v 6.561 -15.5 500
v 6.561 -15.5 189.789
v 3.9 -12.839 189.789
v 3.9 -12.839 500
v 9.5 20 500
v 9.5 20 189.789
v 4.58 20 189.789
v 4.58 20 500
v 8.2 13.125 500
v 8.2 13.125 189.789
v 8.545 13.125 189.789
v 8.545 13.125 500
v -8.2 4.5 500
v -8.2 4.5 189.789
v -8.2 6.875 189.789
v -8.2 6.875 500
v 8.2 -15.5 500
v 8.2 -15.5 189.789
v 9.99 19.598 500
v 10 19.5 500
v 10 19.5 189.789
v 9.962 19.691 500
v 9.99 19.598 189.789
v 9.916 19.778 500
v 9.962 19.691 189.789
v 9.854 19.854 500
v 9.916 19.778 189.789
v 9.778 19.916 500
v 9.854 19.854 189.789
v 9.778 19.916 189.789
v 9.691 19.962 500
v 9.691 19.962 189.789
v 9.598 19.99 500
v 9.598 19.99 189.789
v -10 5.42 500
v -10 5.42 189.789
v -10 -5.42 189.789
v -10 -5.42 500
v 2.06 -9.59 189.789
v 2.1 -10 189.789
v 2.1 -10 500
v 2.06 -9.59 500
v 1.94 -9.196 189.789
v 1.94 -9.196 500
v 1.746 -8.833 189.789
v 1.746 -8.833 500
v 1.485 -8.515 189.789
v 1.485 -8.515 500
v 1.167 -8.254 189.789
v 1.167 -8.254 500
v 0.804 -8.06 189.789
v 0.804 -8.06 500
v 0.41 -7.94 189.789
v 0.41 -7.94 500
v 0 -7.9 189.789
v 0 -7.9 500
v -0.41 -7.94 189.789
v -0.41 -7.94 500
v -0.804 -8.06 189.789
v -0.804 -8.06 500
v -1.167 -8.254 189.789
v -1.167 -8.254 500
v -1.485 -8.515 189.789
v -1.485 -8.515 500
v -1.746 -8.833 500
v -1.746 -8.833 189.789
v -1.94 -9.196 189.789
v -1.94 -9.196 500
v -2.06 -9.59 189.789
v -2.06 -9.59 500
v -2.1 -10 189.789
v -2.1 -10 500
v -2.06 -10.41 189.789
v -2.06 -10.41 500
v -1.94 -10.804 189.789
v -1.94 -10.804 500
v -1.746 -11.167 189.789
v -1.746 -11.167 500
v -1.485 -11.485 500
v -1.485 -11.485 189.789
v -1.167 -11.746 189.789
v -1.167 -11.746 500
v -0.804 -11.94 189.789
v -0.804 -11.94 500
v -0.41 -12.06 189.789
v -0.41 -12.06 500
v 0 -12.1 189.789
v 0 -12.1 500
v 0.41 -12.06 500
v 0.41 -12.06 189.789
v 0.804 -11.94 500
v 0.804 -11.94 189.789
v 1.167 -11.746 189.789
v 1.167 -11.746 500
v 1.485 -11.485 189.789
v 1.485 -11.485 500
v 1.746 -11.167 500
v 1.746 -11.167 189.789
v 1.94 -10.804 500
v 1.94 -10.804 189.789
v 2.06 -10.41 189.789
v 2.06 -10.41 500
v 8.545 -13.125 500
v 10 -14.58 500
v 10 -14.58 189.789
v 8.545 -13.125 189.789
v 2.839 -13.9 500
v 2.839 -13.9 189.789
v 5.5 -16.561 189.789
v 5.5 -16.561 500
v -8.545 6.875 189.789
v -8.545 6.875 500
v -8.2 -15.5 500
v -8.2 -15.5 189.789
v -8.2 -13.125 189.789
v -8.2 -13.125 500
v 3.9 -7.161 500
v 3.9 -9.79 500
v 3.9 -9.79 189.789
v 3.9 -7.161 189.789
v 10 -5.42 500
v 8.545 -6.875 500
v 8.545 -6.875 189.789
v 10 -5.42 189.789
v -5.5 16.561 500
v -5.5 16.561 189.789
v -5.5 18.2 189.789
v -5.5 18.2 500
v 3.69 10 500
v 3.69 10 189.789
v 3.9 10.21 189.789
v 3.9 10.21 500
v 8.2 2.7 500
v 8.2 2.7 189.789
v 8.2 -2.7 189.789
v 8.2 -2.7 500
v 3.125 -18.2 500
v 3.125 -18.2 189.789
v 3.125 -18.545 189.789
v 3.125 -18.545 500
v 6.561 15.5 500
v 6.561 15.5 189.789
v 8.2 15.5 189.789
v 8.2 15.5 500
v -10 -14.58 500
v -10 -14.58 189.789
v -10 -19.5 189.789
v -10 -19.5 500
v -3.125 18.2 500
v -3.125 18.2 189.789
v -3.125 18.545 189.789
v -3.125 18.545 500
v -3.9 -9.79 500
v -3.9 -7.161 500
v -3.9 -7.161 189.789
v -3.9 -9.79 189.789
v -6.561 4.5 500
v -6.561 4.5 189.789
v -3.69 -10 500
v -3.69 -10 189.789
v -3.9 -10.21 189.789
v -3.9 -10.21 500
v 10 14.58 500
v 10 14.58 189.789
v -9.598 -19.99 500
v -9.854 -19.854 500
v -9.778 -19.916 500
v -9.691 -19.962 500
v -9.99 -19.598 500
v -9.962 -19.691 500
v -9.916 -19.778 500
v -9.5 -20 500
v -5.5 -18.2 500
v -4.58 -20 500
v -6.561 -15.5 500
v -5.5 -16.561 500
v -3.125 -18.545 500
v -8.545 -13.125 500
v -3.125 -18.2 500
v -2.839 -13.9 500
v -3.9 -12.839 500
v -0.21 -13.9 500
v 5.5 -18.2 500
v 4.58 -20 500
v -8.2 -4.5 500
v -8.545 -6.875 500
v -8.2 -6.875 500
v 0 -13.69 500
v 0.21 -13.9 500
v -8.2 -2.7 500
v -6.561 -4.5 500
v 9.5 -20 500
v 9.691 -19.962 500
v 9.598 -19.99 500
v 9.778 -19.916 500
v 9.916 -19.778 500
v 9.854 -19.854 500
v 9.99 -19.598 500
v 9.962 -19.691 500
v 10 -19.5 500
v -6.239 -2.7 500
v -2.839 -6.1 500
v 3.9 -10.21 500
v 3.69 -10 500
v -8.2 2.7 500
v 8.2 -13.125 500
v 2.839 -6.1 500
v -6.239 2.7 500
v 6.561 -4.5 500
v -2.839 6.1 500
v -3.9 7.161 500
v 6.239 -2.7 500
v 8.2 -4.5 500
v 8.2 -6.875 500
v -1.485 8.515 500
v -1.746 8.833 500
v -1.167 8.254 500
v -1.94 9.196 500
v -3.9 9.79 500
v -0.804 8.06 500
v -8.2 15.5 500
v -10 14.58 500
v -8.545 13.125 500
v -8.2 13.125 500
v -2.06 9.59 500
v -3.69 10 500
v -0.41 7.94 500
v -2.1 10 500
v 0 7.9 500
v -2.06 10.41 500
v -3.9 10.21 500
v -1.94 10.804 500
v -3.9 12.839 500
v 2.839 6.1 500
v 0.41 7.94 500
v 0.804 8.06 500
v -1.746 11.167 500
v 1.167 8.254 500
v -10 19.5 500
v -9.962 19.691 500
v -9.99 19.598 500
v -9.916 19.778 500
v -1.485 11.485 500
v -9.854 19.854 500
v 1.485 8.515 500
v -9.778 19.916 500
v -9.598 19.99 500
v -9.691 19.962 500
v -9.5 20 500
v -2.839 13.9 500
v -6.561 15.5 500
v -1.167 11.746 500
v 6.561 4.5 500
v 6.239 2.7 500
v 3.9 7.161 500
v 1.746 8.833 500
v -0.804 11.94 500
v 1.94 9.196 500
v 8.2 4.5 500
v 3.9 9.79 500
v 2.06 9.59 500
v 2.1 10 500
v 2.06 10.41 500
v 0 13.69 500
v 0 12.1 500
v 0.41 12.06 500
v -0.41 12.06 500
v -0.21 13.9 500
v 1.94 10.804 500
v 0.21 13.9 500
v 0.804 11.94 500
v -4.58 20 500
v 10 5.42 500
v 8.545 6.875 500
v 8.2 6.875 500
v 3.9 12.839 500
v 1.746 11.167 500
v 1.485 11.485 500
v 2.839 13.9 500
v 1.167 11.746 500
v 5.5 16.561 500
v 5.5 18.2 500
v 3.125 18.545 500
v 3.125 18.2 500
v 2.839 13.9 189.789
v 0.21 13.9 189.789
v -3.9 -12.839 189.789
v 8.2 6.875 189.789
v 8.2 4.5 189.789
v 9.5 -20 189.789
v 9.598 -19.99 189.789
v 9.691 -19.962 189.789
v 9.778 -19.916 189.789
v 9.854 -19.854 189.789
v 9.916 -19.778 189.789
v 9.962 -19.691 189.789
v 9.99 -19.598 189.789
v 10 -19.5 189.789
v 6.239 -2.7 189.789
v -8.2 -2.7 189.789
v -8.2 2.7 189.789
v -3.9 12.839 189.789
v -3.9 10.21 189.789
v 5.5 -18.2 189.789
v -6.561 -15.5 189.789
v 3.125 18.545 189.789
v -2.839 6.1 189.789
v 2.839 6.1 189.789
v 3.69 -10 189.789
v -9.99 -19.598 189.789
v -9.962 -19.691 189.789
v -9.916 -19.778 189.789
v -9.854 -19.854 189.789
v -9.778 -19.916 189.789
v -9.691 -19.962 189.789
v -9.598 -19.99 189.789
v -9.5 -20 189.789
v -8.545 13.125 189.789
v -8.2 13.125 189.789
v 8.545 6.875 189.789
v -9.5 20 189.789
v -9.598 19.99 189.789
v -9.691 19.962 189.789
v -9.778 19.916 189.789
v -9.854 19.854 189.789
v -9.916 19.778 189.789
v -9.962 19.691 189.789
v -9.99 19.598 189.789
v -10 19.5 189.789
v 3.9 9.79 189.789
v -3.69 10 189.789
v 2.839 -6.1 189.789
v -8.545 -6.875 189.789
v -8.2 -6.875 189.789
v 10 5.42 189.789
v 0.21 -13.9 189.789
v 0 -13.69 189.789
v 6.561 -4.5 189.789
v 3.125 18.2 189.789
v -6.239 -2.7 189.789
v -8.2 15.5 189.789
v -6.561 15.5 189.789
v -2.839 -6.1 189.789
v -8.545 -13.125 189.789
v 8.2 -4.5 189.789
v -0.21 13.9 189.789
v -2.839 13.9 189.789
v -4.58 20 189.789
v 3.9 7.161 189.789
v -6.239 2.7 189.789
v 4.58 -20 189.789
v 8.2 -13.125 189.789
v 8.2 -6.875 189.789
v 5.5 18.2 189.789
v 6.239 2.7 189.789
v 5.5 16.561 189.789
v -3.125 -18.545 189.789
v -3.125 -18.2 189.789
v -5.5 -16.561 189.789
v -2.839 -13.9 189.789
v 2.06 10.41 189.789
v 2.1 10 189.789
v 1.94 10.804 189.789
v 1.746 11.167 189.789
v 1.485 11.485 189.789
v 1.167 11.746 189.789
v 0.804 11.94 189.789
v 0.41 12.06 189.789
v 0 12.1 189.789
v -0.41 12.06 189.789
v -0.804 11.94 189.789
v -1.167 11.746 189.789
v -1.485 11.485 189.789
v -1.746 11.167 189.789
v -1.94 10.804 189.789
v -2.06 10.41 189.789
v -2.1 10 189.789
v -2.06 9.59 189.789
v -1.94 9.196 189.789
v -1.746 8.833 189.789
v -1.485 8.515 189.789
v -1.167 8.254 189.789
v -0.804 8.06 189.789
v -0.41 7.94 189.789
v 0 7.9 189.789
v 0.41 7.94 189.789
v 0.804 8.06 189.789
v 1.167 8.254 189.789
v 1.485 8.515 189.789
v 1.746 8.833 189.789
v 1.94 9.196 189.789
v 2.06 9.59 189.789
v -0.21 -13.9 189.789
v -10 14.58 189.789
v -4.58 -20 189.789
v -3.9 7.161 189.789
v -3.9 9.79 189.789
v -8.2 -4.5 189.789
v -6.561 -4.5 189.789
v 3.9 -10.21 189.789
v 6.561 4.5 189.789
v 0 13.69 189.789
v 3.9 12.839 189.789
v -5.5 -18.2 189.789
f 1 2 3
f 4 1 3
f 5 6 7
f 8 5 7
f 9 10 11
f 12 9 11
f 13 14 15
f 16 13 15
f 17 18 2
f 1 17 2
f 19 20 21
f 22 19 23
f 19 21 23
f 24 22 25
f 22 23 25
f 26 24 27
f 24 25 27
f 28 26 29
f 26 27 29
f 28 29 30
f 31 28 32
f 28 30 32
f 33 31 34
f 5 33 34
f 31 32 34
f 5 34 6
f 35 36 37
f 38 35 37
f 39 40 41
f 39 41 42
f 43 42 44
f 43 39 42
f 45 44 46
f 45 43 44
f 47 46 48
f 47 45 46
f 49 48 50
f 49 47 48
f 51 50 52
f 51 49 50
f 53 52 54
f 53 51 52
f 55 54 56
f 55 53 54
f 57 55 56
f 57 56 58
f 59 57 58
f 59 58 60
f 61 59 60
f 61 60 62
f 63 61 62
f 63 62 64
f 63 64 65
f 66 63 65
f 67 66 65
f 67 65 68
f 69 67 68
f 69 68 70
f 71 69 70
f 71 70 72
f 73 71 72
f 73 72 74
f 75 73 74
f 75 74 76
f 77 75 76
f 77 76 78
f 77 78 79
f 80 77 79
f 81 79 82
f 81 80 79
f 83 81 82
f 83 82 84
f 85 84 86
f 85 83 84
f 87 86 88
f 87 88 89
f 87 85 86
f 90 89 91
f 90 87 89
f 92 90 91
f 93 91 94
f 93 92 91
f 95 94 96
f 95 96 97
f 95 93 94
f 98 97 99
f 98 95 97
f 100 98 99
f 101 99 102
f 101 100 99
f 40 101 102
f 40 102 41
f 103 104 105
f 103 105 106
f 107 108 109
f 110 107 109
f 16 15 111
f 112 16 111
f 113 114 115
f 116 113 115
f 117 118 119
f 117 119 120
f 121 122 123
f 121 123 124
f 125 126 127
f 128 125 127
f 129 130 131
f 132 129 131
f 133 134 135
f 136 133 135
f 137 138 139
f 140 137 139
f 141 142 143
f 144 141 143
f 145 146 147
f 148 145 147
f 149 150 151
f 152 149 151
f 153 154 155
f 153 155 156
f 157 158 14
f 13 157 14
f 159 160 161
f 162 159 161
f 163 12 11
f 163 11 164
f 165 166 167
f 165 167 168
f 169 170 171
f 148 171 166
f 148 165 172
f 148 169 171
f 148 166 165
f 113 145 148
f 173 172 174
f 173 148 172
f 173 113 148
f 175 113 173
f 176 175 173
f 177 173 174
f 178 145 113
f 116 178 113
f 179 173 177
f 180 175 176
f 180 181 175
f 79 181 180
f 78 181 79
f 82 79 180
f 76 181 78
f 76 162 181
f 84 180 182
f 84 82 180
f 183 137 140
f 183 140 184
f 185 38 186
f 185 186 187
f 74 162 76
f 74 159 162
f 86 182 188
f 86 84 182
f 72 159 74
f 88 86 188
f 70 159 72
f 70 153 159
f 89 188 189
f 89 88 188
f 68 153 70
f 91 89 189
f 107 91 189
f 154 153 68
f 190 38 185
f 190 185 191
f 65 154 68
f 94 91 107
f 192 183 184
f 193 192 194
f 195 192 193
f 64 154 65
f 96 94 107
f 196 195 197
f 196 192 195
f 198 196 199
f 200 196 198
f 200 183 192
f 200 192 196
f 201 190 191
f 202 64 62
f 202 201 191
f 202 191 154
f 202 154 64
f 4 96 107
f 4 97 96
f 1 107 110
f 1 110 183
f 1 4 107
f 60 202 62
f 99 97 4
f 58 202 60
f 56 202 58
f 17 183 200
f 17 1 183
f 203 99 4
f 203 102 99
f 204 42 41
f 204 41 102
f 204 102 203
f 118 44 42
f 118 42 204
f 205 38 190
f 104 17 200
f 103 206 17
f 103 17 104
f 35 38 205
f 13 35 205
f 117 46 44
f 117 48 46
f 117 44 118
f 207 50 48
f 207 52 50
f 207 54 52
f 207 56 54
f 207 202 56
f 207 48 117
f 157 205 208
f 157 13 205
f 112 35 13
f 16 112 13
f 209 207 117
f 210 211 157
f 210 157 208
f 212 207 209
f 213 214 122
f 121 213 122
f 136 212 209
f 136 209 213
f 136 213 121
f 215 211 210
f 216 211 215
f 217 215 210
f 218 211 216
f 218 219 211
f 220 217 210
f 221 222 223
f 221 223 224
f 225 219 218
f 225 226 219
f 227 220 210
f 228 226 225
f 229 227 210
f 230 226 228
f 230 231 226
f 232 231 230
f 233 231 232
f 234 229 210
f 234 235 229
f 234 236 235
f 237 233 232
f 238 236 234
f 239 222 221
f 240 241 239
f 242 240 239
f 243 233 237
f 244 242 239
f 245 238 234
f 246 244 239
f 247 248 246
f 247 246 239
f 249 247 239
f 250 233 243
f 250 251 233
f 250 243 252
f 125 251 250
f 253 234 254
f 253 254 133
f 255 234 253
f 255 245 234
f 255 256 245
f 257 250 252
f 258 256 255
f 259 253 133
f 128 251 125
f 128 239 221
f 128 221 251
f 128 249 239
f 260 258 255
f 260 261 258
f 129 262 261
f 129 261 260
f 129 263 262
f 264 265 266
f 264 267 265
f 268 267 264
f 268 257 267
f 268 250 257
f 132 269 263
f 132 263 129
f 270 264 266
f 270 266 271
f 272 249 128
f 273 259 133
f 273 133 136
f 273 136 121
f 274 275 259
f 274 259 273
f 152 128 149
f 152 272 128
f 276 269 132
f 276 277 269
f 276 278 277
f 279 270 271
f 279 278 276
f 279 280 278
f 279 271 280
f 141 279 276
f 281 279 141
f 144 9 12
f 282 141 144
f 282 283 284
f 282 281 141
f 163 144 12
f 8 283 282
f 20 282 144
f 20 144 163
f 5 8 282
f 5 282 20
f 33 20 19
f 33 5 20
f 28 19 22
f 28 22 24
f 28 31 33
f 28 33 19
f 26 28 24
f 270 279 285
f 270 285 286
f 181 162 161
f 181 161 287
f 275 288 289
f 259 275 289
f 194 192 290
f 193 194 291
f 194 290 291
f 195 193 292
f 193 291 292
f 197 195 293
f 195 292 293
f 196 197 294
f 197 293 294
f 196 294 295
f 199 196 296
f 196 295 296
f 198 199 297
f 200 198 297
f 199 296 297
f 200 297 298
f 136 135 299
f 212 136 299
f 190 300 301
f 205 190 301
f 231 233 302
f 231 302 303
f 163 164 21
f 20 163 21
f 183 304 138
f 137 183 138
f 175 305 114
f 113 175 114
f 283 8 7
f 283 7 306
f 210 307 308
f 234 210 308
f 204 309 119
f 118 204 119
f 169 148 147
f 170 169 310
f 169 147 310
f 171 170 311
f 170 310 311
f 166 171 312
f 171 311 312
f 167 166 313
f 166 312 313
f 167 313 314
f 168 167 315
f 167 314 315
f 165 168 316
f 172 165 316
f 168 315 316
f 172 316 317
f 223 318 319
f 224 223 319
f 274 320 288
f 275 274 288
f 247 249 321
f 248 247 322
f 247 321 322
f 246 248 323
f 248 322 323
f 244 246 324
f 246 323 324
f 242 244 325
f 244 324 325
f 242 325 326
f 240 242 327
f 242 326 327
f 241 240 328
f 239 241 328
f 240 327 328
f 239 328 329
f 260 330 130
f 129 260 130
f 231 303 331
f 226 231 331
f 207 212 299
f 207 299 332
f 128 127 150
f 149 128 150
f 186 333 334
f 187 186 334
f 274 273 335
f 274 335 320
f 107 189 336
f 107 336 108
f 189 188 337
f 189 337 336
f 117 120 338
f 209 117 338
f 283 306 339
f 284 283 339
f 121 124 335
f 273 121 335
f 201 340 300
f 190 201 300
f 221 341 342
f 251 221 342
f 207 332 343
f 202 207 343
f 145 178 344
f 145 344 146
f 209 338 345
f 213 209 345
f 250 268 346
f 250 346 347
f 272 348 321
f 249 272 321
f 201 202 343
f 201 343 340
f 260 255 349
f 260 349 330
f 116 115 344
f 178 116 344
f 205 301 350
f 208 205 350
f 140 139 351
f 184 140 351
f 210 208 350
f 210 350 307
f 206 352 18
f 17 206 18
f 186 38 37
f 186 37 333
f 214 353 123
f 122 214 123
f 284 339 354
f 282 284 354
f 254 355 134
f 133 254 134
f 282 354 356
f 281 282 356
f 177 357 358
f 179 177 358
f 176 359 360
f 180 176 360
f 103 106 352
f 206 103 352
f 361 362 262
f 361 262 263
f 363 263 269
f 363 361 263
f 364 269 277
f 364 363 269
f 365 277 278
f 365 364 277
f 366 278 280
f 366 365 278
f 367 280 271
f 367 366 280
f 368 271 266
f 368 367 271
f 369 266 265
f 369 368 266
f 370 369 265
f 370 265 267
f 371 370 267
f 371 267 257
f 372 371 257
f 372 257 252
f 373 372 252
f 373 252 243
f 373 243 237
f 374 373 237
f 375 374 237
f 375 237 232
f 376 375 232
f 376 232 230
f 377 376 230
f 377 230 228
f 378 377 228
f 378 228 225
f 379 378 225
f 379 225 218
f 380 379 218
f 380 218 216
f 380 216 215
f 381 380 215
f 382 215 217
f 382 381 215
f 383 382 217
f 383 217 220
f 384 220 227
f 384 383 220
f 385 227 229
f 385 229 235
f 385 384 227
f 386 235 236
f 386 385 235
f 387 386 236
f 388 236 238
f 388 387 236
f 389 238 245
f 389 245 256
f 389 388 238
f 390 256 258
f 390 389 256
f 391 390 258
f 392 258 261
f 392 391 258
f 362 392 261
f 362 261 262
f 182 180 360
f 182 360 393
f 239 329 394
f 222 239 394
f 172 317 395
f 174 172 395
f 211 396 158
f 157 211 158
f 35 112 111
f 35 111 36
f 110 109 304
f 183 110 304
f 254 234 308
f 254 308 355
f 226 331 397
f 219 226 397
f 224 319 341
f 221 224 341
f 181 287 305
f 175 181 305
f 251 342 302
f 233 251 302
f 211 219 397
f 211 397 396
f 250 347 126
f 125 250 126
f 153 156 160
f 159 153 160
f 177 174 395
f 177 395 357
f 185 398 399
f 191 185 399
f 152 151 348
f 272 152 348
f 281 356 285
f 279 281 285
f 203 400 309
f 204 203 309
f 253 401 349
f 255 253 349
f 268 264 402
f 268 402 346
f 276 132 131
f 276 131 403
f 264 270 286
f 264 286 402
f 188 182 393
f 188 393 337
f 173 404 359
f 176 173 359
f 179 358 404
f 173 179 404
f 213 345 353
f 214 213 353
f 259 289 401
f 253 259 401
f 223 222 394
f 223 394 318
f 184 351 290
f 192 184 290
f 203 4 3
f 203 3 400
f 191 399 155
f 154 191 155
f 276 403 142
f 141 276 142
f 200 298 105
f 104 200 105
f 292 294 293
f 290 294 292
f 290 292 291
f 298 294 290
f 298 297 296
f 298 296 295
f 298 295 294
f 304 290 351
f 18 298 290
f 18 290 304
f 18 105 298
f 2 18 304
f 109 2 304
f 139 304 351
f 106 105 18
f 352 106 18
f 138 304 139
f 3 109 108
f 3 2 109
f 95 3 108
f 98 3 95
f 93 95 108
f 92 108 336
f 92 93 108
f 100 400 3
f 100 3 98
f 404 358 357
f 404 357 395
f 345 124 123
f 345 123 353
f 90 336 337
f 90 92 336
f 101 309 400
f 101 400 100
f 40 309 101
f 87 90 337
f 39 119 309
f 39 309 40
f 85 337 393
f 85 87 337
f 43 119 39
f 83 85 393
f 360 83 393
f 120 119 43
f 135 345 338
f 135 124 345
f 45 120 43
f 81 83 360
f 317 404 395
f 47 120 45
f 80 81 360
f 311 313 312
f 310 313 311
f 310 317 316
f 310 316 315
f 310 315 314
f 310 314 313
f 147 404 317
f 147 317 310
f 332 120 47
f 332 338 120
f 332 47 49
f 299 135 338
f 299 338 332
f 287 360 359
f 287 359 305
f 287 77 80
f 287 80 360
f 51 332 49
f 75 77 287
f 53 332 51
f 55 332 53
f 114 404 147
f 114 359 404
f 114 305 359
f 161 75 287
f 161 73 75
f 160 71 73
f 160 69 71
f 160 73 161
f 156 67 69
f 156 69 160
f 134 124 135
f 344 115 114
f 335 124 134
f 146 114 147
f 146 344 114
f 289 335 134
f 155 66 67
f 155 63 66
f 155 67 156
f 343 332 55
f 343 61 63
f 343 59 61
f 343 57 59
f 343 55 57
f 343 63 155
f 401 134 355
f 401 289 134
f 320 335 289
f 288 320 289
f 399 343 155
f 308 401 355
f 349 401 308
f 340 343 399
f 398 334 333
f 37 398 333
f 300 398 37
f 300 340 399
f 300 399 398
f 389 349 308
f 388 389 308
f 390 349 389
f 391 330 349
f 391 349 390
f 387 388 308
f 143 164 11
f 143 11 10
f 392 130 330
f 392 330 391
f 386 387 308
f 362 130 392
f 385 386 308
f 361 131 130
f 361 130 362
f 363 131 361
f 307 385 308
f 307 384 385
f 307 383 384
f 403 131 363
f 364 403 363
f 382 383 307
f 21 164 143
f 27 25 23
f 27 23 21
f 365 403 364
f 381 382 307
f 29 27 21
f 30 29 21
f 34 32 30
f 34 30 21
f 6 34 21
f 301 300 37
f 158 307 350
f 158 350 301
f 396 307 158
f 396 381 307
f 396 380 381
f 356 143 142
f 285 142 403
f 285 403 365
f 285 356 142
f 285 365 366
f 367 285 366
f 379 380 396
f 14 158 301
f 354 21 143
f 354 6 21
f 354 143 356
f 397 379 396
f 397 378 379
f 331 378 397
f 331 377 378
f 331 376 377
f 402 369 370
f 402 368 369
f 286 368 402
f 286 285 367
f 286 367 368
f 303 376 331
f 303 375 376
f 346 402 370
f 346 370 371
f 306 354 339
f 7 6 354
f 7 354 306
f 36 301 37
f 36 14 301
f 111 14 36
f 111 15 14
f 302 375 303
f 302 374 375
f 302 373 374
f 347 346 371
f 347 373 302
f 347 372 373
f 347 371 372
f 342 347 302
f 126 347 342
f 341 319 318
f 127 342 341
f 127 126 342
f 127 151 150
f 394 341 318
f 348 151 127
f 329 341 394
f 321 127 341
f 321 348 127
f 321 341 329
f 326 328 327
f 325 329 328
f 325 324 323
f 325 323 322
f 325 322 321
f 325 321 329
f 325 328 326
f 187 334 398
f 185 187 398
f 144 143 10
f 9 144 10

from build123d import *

# Parameters (mm, degrees)
SKETCH1_R           = 2.1
BOSS_EXTRUDE1_DEPTH = 500
SKETCH2_W           = 72.199541976
SKETCH2_H           = 58.054703084
CUT_EXTRUDE2_DEPTH  = 189.7888


with BuildPart() as part:
    # Sketch1 → Boss-Extrude1 (new body)
    with BuildSketch(Plane.XY):
        with BuildLine():
            Line((4.58, -20), (9.5, -20))
            ThreePointArc((9.5, -20), (9.853553391, -19.853553391), (10, -19.5))
            Line((10, -19.5), (10, -14.58))
            Line((10, -14.58), (8.545, -13.125))
            Line((8.545, -13.125), (8.2, -13.125))
            Line((8.2, -13.125), (8.2, -15.5))
            Line((8.2, -15.5), (6.560660172, -15.5))
            Line((6.560660172, -15.5), (3.9, -12.839339828))
            Line((3.9, -12.839339828), (3.9, -10.21))
            Line((3.9, -10.21), (3.69, -10))
            Line((3.69, -10), (3.9, -9.79))
            Line((3.9, -9.79), (3.9, -7.160660172))
            Line((3.9, -7.160660172), (6.560660172, -4.5))
            Line((6.560660172, -4.5), (8.2, -4.5))
            Line((8.2, -4.5), (8.2, -6.875))
            Line((8.2, -6.875), (8.545, -6.875))
            Line((8.545, -6.875), (10, -5.42))
            Line((10, -5.42), (10, 5.42))
            Line((10, 5.42), (8.545, 6.875))
            Line((8.545, 6.875), (8.2, 6.875))
            Line((8.2, 6.875), (8.2, 4.5))
            Line((8.2, 4.5), (6.560660172, 4.5))
            Line((6.560660172, 4.5), (3.9, 7.160660172))
            Line((3.9, 7.160660172), (3.9, 9.79))
            Line((3.9, 9.79), (3.69, 10))
            Line((3.69, 10), (3.9, 10.21))
            Line((3.9, 10.21), (3.9, 12.839339828))
            Line((3.9, 12.839339828), (6.560660172, 15.5))
            Line((6.560660172, 15.5), (8.2, 15.5))
            Line((8.2, 15.5), (8.2, 13.125))
            Line((8.2, 13.125), (8.545, 13.125))
            Line((8.545, 13.125), (10, 14.58))
            Line((10, 14.58), (10, 19.5))
            ThreePointArc((10, 19.5), (9.853553391, 19.853553391), (9.5, 20))
            Line((9.5, 20), (4.58, 20))
            Line((4.58, 20), (3.125, 18.545))
            Line((3.125, 18.545), (3.125, 18.2))
            Line((3.125, 18.2), (5.5, 18.2))
            Line((5.5, 18.2), (5.5, 16.560660172))
            Line((5.5, 16.560660172), (2.839339828, 13.9))
            Line((2.839339828, 13.9), (0.21, 13.9))
            Line((0.21, 13.9), (0, 13.69))
            Line((0, 13.69), (-0.21, 13.9))
            Line((-0.21, 13.9), (-2.839339828, 13.9))
            Line((-2.839339828, 13.9), (-5.5, 16.560660172))
            Line((-5.5, 16.560660172), (-5.5, 18.2))
            Line((-5.5, 18.2), (-3.125, 18.2))
            Line((-3.125, 18.2), (-3.125, 18.545))
            Line((-3.125, 18.545), (-4.58, 20))
            Line((-4.58, 20), (-9.5, 20))
            ThreePointArc((-9.5, 20), (-9.853553391, 19.853553391), (-10, 19.5))
            Line((-10, 19.5), (-10, 14.58))
            Line((-10, 14.58), (-8.545, 13.125))
            Line((-8.545, 13.125), (-8.2, 13.125))
            Line((-8.2, 13.125), (-8.2, 15.5))
            Line((-8.2, 15.5), (-6.560660172, 15.5))
            Line((-6.560660172, 15.5), (-3.9, 12.839339828))
            Line((-3.9, 12.839339828), (-3.9, 10.21))
            Line((-3.9, 10.21), (-3.69, 10))
            Line((-3.69, 10), (-3.9, 9.79))
            Line((-3.9, 9.79), (-3.9, 7.160660172))
            Line((-3.9, 7.160660172), (-6.560660172, 4.5))
            Line((-6.560660172, 4.5), (-8.2, 4.5))
            Line((-8.2, 4.5), (-8.2, 6.875))
            Line((-8.2, 6.875), (-8.545, 6.875))
            Line((-8.545, 6.875), (-10, 5.42))
            Line((-10, 5.42), (-10, -5.42))
            Line((-10, -5.42), (-8.545, -6.875))
            Line((-8.545, -6.875), (-8.2, -6.875))
            Line((-8.2, -6.875), (-8.2, -4.5))
            Line((-8.2, -4.5), (-6.560660172, -4.5))
            Line((-6.560660172, -4.5), (-3.9, -7.160660172))
            Line((-3.9, -7.160660172), (-3.9, -9.79))
            Line((-3.9, -9.79), (-3.69, -10))
            Line((-3.69, -10), (-3.9, -10.21))
            Line((-3.9, -10.21), (-3.9, -12.839339828))
            Line((-3.9, -12.839339828), (-6.560660172, -15.5))
            Line((-6.560660172, -15.5), (-8.2, -15.5))
            Line((-8.2, -15.5), (-8.2, -13.125))
            Line((-8.2, -13.125), (-8.545, -13.125))
            Line((-8.545, -13.125), (-10, -14.58))
            Line((-10, -14.58), (-10, -19.5))
            ThreePointArc((-10, -19.5), (-9.853553391, -19.853553391), (-9.5, -20))
            Line((-9.5, -20), (-4.58, -20))
            Line((-4.58, -20), (-3.125, -18.545))
            Line((-3.125, -18.545), (-3.125, -18.2))
            Line((-3.125, -18.2), (-5.5, -18.2))
            Line((-5.5, -18.2), (-5.5, -16.560660172))
            Line((-5.5, -16.560660172), (-2.839339828, -13.9))
            Line((-2.839339828, -13.9), (-0.21, -13.9))
            Line((-0.21, -13.9), (0, -13.69))
            Line((0, -13.69), (0.21, -13.9))
            Line((0.21, -13.9), (2.839339828, -13.9))
            Line((2.839339828, -13.9), (5.5, -16.560660172))
            Line((5.5, -16.560660172), (5.5, -18.2))
            Line((5.5, -18.2), (3.125, -18.2))
            Line((3.125, -18.2), (3.125, -18.545))
            Line((3.125, -18.545), (4.58, -20))
        make_face()
        with Locations((0, -10)):
            Circle(SKETCH1_R, mode=Mode.SUBTRACT)
        Polygon((-6.239339828, -2.7), (-8.2, -2.7), (-8.2, 2.7), (-6.239339828, 2.7), (-2.839339828, 6.1), (2.839339828, 6.1), (6.239339828, 2.7), (8.2, 2.7), (8.2, -2.7), (6.239339828, -2.7), (2.839339828, -6.1), (-2.839339828, -6.1), align=None, mode=Mode.SUBTRACT)
        with Locations((0, 10)):
            Circle(SKETCH1_R, mode=Mode.SUBTRACT)
    extrude(amount=BOSS_EXTRUDE1_DEPTH)

    # Sketch2 → Cut-Extrude2 (cut)
    with BuildSketch(Plane(origin=(0, 0, 0), x_dir=(-1, 0, 0), z_dir=(0, 0, -1))):
        with Locations((-4.42817029, -8.078427536)):
            Rectangle(SKETCH2_W, SKETCH2_H)
    extrude(amount=-CUT_EXTRUDE2_DEPTH, mode=Mode.SUBTRACT)


solid = part.part
